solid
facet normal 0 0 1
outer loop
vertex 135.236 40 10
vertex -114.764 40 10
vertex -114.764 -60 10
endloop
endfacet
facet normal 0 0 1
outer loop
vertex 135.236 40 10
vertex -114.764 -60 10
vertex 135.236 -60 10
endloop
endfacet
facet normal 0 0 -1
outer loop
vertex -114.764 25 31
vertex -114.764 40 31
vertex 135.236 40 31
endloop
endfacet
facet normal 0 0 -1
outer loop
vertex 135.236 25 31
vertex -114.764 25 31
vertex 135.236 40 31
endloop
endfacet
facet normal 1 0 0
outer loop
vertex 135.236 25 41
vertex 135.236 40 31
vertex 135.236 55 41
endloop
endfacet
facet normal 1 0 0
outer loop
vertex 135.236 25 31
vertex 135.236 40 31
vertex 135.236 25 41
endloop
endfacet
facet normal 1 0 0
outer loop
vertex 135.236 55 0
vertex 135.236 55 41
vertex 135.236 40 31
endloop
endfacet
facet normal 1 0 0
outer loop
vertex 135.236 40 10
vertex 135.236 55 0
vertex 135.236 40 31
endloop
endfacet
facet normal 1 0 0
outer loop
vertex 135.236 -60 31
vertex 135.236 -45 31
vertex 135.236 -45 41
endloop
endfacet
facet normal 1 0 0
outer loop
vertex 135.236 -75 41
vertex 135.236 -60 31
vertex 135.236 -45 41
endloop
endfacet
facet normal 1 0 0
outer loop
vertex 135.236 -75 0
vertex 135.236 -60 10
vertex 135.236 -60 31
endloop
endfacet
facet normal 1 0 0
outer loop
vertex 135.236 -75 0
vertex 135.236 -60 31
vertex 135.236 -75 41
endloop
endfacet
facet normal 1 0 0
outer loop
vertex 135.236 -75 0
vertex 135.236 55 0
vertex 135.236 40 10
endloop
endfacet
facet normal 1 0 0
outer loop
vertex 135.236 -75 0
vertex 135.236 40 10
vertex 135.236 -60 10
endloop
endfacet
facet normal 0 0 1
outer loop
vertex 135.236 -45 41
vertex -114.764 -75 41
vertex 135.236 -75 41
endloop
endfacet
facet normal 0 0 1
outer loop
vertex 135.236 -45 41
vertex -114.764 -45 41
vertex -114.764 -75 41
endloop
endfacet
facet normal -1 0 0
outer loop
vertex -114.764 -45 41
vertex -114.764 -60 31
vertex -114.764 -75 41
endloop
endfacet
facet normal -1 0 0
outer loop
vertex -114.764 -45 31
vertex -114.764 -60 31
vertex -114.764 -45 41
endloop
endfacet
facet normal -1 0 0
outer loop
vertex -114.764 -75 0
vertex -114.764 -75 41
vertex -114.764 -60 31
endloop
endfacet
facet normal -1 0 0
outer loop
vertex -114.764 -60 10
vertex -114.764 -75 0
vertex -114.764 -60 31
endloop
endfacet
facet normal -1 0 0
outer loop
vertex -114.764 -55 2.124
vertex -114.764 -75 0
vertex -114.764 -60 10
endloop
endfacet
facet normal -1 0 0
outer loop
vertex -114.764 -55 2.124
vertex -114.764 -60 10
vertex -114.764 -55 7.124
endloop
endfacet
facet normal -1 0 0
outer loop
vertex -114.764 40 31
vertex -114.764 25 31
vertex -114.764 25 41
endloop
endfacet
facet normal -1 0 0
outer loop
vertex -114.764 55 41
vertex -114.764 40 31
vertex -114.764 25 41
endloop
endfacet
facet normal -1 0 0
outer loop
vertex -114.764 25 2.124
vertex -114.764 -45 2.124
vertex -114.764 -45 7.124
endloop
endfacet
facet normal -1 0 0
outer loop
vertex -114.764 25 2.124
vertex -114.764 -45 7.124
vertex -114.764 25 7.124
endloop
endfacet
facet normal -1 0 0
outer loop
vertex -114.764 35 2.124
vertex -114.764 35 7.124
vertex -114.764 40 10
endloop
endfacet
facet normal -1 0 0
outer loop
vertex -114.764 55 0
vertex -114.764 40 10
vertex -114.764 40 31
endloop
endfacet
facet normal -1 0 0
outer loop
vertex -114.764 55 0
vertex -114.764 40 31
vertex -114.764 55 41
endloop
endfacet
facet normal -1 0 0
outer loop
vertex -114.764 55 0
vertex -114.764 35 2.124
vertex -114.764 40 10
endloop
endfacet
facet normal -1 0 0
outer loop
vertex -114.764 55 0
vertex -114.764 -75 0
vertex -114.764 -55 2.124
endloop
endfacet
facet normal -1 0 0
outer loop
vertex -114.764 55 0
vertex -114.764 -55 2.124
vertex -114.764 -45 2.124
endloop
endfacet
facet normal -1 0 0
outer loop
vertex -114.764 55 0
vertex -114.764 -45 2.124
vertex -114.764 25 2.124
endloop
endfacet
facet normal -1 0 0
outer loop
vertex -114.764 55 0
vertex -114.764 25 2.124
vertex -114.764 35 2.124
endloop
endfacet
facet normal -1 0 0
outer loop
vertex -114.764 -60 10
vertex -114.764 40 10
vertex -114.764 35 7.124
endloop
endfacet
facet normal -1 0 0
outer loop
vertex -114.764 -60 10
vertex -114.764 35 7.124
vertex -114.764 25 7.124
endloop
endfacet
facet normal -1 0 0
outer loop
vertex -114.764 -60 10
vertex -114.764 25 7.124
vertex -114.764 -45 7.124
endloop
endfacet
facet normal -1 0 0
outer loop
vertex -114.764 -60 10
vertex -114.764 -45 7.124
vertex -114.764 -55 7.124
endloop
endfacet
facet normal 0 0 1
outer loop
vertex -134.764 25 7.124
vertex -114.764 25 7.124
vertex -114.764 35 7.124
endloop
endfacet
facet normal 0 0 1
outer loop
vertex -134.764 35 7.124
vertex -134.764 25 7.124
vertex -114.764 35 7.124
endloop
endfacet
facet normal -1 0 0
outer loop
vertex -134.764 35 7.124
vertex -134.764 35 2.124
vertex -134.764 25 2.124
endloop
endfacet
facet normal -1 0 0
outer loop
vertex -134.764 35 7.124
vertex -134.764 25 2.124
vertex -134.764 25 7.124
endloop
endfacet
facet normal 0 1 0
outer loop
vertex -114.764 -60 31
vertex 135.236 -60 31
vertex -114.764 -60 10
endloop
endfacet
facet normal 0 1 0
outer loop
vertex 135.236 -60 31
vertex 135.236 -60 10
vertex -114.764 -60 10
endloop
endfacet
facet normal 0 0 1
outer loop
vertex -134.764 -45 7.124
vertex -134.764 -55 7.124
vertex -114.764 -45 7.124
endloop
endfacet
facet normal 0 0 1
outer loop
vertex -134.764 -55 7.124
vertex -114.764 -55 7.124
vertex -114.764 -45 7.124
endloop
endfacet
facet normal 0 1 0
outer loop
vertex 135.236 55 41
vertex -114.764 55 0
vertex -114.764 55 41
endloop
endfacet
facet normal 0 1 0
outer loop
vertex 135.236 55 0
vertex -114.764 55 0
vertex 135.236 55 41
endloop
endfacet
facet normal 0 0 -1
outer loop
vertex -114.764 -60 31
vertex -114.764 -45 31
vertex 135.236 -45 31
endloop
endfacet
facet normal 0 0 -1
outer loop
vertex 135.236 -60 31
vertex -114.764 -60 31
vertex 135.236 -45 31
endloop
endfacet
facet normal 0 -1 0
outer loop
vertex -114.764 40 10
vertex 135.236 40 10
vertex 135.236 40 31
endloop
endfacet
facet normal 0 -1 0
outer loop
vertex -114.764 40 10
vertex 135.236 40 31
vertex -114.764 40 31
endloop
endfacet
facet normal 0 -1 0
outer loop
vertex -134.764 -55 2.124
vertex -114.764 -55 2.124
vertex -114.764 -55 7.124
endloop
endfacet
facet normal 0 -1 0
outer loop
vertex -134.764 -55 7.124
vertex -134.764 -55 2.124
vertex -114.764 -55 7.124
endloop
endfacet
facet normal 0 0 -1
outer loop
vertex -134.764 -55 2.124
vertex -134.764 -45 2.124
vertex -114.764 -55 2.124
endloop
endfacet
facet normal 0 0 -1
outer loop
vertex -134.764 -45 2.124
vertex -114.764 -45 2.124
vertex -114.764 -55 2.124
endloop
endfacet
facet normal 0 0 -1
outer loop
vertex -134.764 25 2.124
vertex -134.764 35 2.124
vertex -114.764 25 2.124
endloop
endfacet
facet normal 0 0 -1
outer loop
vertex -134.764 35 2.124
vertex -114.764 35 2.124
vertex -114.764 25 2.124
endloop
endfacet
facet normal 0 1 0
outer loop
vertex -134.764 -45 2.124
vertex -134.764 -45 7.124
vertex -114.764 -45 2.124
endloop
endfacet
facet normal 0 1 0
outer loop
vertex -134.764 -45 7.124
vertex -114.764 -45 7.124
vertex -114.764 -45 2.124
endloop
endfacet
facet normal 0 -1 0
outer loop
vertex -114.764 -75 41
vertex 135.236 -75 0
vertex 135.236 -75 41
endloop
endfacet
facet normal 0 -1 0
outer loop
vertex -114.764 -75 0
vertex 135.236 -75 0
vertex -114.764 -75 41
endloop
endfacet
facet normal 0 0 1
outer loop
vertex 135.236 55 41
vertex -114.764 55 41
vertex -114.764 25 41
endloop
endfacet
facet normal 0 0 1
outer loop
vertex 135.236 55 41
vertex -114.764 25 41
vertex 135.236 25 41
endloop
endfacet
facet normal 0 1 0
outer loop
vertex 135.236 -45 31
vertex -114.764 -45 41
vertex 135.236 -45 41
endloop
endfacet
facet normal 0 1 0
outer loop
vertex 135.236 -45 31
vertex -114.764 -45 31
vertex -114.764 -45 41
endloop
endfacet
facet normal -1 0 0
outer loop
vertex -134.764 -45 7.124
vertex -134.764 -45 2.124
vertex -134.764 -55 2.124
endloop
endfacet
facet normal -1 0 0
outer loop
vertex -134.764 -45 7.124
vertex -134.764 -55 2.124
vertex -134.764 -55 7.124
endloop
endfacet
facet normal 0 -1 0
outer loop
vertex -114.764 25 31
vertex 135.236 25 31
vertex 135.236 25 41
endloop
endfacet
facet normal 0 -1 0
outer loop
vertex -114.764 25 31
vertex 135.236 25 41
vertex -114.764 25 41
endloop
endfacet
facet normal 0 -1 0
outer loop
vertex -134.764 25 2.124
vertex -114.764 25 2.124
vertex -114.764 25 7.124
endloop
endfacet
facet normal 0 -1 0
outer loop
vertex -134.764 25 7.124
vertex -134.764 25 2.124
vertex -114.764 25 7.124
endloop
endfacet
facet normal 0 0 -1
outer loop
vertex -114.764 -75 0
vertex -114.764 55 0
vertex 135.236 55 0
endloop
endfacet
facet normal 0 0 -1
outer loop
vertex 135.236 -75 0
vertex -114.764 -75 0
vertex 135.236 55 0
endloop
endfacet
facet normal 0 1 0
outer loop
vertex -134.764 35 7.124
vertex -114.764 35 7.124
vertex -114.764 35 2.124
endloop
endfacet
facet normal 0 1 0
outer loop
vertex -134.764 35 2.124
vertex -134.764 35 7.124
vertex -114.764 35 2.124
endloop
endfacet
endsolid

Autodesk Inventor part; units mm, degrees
ref_plane "YZ Plane" through (0, 0, 0) normal (1, 0, 0) x (0, 1, 0)
ref_plane "XZ Plane" through (0, 0, 0) normal (0, 1, 0) x (-1, 0, 0)
ref_plane "XY Plane" through (0, 0, 0) normal (0, 0, 1) x (1, 0, 0)
sketch "Sketch1" plane through (0, 0, 0) normal (0, 0, 1) x (1, 0, 0)
  line L0 (-114.7642, 55) -> (135.2358, 55)
  line L1 (135.2358, 55) -> (135.2358, -75)
  line L2 (135.2358, -75) -> (-114.7642, -75)
  line L3 (-114.7642, -75) -> (-114.7642, 55)
  point P0 (0, 0)
  dimension "d0" = 250
  dimension "d1" = 130
extrude "Extrusion1" add sketch "Sketch1" along normal blind 10
sketch "Sketch2" plane through (0, 0, 10) normal (0, 0, 1) x (1, 0, 0)
  line L0 (135.2358, 55) -> (-114.7642, 55) projected
  line L1 (135.2358, -75) -> (135.2358, 55) projected
  line L2 (-114.7642, 55) -> (135.2358, 55)
  line L3 (135.2358, 55) -> (135.2358, 40)
  line L4 (135.2358, 40) -> (-114.7642, 40)
  line L5 (-114.7642, 40) -> (-114.7642, 55)
  line L6 (-114.7642, -75) -> (135.2358, -75)
  line L7 (135.2358, -75) -> (135.2358, -60)
  line L8 (135.2358, -60) -> (-114.7642, -60)
  line L9 (-114.7642, -60) -> (-114.7642, -75)
  point P0 (0, 0)
  dimension "d4" = 15
  dimension "d5" = 15
extrude "Extrusion2" add sketch "Sketch2" along normal blind 21
sketch "Sketch3" plane through (0, 0, 31) normal (0, 0, 1) x (1, 0, 0)
  line L0 (-114.7642, 55) -> (-114.7642, -75) projected
  line L1 (135.2358, -60) -> (135.2358, 40) projected
  line L2 (-114.7642, 55) -> (135.2358, 55)
  line L3 (135.2358, 55) -> (135.2358, 25)
  line L4 (135.2358, 25) -> (-114.7642, 25)
  line L5 (-114.7642, 25) -> (-114.7642, 55)
  line L6 (135.2358, -75) -> (135.2358, -60) projected
  line L7 (135.2358, -75) -> (-114.7642, -75)
  line L8 (-114.7642, -75) -> (-114.7642, -45)
  line L9 (-114.7642, -45) -> (135.2358, -45)
  line L10 (135.2358, -45) -> (135.2358, -75)
  point P0 (0, 0)
  point P1 (-114.7642, -45)
  dimension "d8" = 30
  dimension "d9" = 30
extrude "Extrusion3" add sketch "Sketch3" along normal blind 10 contours L2 L3 L1 L4 L0 | L9 L1 L6 L7 L0
sketch "Sketch4" plane through (-114.7642, -75, 0) normal (-1, 0, 0) x (0, 0, 1)
  line L0 (7.1242, 110) -> (2.1242, 110)
  line L1 (2.1242, 110) -> (2.1242, 100)
  line L2 (2.1242, 100) -> (7.1242, 100)
  line L3 (7.1242, 100) -> (7.1242, 110)
  line L4 (7.1242, 30) -> (2.1242, 30)
  line L5 (2.1242, 30) -> (2.1242, 20)
  line L6 (2.1242, 20) -> (7.1242, 20)
  line L7 (7.1242, 20) -> (7.1242, 30)
  line L8 (31, 100) -> (41, 100) projected
  line L9 (31, 30) -> (41, 30) projected
  point P0 (0, 75)
  dimension "d12" = 5
  dimension "d13" = 10
  dimension "d14" = 10
  dimension "d15" = 0
  dimension "d16" = 0
extrude "Extrusion4" add sketch "Sketch4" along normal blind 20
equation "\"d5\" = d4"
equation "\"d9\" = d8"
properties part number "Part2_with_things"
